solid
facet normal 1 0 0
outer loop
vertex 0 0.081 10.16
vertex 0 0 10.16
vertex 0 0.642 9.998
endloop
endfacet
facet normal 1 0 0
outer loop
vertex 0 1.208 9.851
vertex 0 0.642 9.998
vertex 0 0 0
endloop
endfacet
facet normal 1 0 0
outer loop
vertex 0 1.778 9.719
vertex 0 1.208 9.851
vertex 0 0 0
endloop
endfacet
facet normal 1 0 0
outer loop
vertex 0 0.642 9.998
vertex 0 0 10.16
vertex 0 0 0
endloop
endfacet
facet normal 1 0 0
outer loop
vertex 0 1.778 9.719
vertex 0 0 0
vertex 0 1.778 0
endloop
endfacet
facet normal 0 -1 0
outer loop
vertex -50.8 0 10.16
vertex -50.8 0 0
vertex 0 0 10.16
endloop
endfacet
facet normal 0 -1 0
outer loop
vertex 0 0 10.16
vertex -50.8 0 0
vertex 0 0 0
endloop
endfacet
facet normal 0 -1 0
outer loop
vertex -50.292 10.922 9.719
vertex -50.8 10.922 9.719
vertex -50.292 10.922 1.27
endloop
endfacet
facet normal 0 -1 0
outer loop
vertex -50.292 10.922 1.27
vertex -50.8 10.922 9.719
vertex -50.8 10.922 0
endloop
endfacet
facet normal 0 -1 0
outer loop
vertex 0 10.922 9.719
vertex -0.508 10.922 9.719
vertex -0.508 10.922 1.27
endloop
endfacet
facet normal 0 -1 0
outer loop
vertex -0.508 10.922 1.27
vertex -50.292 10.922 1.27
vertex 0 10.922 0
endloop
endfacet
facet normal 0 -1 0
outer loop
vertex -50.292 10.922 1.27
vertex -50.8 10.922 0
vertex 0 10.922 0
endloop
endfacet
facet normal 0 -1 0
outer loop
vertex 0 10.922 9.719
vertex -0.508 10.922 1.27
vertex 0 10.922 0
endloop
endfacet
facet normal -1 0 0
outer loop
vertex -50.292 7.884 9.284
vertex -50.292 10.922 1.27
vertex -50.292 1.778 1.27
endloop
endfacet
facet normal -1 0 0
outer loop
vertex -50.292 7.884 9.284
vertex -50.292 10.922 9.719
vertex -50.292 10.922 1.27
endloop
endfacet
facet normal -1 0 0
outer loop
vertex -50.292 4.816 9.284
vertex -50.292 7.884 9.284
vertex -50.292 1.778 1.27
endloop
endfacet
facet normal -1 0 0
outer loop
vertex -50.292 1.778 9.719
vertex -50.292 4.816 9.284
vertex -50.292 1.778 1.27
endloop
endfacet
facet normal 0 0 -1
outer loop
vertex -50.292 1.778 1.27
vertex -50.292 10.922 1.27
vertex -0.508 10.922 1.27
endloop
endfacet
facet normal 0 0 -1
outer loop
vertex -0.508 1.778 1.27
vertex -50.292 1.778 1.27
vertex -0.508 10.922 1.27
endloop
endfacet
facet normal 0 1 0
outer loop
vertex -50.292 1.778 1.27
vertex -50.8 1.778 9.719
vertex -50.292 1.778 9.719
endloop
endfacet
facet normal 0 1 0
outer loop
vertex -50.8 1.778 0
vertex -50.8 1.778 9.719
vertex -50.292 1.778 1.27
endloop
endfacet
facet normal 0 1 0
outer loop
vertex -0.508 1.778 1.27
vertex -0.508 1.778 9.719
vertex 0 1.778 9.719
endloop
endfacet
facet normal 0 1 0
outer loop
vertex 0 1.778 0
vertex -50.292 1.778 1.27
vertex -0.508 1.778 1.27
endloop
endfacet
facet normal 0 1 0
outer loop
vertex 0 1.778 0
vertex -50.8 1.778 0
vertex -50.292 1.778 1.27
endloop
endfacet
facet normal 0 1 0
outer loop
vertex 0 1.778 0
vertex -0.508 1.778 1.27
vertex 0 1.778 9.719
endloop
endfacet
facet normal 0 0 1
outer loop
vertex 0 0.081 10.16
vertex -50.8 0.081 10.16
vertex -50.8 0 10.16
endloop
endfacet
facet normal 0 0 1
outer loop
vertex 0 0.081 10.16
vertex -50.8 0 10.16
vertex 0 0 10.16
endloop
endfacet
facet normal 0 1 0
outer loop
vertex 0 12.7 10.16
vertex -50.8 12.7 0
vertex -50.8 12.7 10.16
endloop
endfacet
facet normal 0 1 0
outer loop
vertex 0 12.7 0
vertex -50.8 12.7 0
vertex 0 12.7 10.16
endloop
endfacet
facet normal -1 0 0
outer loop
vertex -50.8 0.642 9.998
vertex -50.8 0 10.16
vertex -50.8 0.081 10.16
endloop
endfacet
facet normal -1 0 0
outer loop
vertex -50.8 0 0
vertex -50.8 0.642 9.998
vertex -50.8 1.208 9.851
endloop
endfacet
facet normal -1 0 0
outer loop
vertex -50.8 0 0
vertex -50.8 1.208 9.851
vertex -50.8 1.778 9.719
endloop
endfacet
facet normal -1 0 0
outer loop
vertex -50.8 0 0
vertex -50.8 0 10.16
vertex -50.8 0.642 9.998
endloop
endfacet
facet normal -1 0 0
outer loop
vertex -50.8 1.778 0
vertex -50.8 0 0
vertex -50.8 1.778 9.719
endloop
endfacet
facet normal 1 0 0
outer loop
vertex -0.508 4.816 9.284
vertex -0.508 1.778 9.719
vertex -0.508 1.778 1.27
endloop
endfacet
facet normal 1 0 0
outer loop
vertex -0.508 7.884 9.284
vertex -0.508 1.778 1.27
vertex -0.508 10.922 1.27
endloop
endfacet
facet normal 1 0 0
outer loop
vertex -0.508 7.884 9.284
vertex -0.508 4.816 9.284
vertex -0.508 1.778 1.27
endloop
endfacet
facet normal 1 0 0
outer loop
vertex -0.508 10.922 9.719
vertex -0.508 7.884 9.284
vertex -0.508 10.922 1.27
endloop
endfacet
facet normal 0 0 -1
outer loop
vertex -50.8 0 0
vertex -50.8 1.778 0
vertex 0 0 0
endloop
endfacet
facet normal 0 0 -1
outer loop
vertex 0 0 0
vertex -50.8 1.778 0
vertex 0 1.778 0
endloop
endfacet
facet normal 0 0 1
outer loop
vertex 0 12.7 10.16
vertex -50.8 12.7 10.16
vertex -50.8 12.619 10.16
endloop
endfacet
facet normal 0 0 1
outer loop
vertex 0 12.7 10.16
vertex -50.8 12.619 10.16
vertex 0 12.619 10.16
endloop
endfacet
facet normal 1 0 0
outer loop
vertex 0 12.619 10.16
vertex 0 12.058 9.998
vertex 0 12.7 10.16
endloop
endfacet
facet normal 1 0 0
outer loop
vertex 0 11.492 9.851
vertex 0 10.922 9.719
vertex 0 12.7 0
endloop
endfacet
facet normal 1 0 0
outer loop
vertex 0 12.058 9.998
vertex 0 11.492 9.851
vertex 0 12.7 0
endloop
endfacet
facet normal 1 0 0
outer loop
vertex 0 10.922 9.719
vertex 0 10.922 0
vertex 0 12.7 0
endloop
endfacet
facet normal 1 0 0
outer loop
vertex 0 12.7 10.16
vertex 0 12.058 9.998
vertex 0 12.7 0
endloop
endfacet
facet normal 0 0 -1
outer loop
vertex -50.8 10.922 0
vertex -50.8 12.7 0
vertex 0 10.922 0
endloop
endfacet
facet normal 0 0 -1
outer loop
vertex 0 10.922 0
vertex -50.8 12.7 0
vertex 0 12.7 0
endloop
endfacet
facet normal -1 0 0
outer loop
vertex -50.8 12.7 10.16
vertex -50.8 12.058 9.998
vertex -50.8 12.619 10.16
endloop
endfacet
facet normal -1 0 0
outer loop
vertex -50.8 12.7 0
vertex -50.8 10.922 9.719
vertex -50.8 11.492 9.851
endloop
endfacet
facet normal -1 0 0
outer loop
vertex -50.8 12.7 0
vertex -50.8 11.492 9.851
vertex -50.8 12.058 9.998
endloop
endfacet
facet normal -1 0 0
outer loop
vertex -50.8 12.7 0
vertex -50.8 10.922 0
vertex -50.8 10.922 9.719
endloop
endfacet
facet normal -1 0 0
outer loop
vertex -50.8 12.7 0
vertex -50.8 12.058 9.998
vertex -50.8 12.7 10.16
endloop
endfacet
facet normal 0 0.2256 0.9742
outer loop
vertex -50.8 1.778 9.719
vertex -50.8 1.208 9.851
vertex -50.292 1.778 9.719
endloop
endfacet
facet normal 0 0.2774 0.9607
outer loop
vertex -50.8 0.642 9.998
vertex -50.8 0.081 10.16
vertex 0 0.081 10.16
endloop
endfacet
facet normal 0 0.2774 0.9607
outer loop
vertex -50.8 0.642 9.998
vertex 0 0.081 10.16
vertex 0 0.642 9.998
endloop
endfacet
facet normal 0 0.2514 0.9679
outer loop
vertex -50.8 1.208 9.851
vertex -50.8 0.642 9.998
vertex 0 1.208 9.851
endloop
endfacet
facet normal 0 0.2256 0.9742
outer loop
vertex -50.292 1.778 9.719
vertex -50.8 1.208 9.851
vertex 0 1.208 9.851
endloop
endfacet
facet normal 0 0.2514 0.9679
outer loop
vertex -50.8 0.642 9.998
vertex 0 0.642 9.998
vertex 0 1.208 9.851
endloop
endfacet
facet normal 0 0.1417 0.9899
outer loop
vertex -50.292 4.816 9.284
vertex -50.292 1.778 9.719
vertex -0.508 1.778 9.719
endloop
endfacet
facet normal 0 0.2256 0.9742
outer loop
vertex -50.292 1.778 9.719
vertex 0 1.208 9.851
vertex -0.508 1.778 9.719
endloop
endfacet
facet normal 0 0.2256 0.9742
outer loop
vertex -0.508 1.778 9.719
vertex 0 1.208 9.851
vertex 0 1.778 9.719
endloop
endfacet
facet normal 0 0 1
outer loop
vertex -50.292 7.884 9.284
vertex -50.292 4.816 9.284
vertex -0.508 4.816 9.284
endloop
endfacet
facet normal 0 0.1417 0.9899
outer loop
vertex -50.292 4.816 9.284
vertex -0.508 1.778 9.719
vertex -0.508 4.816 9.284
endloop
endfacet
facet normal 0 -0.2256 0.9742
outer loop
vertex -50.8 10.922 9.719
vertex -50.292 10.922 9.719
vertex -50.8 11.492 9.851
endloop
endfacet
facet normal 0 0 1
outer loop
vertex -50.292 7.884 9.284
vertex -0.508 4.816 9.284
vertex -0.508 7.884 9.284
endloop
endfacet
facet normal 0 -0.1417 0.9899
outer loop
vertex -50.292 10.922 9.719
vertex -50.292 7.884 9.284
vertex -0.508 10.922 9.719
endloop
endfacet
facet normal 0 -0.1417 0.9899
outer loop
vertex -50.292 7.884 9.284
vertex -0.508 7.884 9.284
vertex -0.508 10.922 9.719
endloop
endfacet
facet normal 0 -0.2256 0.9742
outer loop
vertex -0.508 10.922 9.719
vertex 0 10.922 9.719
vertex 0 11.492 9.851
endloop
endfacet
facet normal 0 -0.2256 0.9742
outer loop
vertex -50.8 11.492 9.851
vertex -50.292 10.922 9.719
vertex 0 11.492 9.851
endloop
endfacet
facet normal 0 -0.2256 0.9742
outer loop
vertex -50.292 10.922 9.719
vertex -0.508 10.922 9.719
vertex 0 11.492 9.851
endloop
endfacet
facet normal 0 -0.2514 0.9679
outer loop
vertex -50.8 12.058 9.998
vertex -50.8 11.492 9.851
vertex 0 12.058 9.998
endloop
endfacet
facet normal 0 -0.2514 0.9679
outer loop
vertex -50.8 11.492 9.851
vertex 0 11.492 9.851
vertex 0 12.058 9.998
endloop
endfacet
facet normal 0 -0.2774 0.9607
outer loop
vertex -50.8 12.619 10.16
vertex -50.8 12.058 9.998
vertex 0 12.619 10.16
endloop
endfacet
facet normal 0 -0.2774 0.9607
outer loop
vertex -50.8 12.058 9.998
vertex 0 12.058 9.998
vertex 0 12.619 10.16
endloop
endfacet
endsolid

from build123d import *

# Parameters (mm, degrees)
F0_W     = 50.8
F0_H     = 12.7
F1_DEPTH = 10.16
F2_W     = 51.661278
F2_H     = 9.144
F3_DEPTH = 1.27
F5_DEPTH = 59.69
F7_DEPTH = 0.508
F9_DEPTH = 0.508


with BuildPart() as f1:
    # F0 (on Top) → F1 (new body)
    with BuildSketch(Plane.XY):
        with Locations((-25.4, 6.35)):
            Rectangle(F0_W, F0_H)
    extrude(amount=F1_DEPTH)

    # F2 (on Top) → F3 (cut)
    with BuildSketch(Plane.XY):
        with Locations((-25.830639, 6.35)):
            Rectangle(F2_W, F2_H)
    extrude(amount=F3_DEPTH, mode=Mode.SUBTRACT)

    # F4 (on face) → F5 (cut)
    with BuildSketch(Plane.YZ):
        with BuildLine():
            ThreePointArc((12.619456, 10.16), (23.691939, 17.959451), (27.94, 30.819671))
            ThreePointArc((27.94, 30.819671), (-6.51022, 48.16161), (0.080544, 10.16))
            Line((0.080544, 10.16), (12.619456, 10.16))
        make_face()
        with BuildLine():
            Line((12.619456, 10.16), (0.080544, 10.16))
            ThreePointArc((0.080544, 10.16), (6.35, 9.229671), (12.619456, 10.16))
        make_face()
    extrude(amount=-F5_DEPTH, mode=Mode.SUBTRACT)

    # F6 (on face) → F7 (cut)
    with BuildSketch(Plane.YZ):
        with BuildLine():
            Line((1.778, 9.719318), (1.778, 1.27))
            Line((1.778, 1.27), (10.922, 1.27))
            Line((10.922, 1.27), (10.922, 9.719318))
            ThreePointArc((10.922, 9.719318), (6.35, 9.229671), (1.778, 9.719318))
        make_face()
    extrude(amount=-F7_DEPTH, mode=Mode.SUBTRACT)

    # F8 (on face) → F9 (cut)
    with BuildSketch(Plane(origin=(-50.8, 0, 0), x_dir=(0, -1, 0), z_dir=(-1, 0, 0))):
        with BuildLine():
            Line((-10.922, 1.27), (-1.778, 1.27))
            Line((-1.778, 1.27), (-1.778, 9.719318))
            ThreePointArc((-1.778, 9.719318), (-6.35, 9.229671), (-10.922, 9.719318))
            Line((-10.922, 9.719318), (-10.922, 1.27))
        make_face()
    extrude(amount=-F9_DEPTH, mode=Mode.SUBTRACT)


solid = f1.part
